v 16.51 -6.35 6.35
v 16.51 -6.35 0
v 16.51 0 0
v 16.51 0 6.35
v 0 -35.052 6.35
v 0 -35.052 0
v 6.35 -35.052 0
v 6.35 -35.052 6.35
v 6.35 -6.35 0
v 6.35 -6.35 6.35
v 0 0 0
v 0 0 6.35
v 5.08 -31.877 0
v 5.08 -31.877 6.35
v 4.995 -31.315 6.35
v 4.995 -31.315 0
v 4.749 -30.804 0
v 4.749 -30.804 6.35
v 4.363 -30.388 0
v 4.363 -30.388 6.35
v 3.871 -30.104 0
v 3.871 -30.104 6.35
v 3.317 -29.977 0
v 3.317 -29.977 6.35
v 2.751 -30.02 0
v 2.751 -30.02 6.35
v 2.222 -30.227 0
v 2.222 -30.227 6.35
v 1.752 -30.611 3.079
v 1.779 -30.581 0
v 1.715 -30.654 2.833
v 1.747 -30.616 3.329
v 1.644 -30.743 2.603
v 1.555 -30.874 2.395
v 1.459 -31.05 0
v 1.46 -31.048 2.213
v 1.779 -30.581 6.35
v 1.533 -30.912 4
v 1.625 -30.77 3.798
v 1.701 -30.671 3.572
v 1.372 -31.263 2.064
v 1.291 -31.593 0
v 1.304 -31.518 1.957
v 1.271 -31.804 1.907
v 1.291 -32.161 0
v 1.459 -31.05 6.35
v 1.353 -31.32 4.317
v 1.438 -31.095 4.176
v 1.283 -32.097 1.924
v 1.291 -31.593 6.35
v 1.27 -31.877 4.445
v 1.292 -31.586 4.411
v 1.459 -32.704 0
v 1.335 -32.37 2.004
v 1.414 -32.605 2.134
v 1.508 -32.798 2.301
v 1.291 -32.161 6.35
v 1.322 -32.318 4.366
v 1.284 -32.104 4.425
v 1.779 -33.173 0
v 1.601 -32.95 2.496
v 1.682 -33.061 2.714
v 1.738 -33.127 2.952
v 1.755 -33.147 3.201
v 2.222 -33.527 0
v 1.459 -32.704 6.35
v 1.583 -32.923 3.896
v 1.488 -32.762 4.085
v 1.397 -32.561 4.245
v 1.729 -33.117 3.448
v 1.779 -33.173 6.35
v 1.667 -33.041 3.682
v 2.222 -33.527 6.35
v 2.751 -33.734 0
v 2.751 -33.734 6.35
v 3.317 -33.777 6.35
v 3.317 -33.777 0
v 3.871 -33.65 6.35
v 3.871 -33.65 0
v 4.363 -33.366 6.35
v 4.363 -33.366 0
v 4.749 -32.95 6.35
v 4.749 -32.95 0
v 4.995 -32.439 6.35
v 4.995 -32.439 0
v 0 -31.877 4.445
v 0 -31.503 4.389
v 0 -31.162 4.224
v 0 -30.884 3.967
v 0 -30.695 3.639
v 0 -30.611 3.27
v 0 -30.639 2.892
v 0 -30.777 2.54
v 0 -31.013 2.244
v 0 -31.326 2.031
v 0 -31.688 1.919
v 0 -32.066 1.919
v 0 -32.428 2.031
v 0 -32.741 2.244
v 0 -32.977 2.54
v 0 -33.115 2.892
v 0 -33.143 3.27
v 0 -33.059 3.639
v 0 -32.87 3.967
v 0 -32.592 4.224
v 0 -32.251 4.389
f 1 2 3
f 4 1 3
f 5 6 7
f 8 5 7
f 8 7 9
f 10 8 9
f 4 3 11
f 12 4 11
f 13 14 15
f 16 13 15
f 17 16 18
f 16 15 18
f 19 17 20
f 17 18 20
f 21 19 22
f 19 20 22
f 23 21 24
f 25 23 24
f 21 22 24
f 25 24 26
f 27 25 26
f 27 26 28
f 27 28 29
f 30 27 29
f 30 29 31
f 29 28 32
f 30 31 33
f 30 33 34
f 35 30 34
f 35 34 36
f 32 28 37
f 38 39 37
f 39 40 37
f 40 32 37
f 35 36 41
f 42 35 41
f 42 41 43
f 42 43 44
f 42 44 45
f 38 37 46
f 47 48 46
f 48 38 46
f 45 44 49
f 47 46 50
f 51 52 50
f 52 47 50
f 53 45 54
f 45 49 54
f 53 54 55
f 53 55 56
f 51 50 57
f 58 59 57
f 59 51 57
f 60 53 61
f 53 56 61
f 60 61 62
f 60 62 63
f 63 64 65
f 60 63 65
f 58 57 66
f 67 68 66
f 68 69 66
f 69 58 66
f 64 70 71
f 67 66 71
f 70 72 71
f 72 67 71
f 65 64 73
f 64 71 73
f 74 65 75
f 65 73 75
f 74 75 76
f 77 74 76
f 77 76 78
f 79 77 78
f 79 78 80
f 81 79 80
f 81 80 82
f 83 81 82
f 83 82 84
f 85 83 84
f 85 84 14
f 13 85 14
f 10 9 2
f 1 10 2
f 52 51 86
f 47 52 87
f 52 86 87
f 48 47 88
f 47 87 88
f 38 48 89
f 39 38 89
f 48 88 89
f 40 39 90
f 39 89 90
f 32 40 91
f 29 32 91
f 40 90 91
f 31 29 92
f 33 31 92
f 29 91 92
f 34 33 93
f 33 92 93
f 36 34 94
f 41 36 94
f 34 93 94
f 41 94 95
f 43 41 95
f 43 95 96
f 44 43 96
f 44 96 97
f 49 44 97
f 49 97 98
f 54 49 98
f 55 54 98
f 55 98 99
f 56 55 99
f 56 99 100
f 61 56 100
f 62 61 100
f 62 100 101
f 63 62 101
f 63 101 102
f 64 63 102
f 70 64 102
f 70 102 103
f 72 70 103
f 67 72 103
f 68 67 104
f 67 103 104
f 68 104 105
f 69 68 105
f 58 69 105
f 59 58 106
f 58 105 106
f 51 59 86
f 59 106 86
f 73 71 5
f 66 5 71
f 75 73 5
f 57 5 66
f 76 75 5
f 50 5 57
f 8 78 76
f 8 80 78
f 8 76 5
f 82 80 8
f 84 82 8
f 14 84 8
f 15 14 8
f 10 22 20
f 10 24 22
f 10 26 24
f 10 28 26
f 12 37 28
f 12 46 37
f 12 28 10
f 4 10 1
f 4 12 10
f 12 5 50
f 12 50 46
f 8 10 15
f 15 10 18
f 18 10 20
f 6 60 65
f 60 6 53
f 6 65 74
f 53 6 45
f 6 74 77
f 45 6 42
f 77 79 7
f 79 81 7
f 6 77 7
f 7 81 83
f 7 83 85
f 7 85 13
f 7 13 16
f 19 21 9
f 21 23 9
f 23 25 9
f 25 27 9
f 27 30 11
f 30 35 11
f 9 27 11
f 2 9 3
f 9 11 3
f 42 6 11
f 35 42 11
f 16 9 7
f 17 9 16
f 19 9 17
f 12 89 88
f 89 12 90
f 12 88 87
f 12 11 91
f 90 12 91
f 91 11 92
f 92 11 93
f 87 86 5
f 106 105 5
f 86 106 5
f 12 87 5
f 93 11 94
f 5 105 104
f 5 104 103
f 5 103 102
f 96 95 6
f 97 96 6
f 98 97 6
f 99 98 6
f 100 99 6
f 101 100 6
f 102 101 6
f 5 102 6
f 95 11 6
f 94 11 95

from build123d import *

# Parameters (mm, degrees)
BOSS_EXTRUDE1_DEPTH = 6.35
SKETCH2_R           = 1.905
CUT_EXTRUDE1_DEPTH  = 7.35
CUT_EXTRUDE2_REACH  = 18.51
SKETCH3_R           = 1.27


with BuildPart() as part:
    # Sketch1 → Boss-Extrude1 (new body)
    with BuildSketch(Plane.XY):
        Polygon((0, 0), (0, -35.052), (6.35, -35.052), (6.35, -6.35), (16.51, -6.35), (16.51, 0), align=None)
    extrude(amount=BOSS_EXTRUDE1_DEPTH)

    # Sketch2 → Cut-Extrude1 (cut, through all)
    with BuildSketch(Plane.XY.offset(6.35)):
        with Locations((3.175, -31.877)):
            Circle(SKETCH2_R)
    extrude(amount=-CUT_EXTRUDE1_DEPTH, mode=Mode.SUBTRACT)

    # Sketch3 → Cut-Extrude2 (cut, up to next)
    with BuildSketch(Plane.ZY, mode=Mode.PRIVATE) as cut_extrude2_sk1:
        with Locations((3.175, -31.877)):
            Circle(SKETCH3_R)
    cut_extrude2_tool1 = extrude(cut_extrude2_sk1.sketch, amount=-CUT_EXTRUDE2_REACH, mode=Mode.PRIVATE) & part.part
    add(cut_extrude2_tool1.solids().sort_by_distance((0, -31.877, 3.175))[0], mode=Mode.SUBTRACT)


solid = part.part
